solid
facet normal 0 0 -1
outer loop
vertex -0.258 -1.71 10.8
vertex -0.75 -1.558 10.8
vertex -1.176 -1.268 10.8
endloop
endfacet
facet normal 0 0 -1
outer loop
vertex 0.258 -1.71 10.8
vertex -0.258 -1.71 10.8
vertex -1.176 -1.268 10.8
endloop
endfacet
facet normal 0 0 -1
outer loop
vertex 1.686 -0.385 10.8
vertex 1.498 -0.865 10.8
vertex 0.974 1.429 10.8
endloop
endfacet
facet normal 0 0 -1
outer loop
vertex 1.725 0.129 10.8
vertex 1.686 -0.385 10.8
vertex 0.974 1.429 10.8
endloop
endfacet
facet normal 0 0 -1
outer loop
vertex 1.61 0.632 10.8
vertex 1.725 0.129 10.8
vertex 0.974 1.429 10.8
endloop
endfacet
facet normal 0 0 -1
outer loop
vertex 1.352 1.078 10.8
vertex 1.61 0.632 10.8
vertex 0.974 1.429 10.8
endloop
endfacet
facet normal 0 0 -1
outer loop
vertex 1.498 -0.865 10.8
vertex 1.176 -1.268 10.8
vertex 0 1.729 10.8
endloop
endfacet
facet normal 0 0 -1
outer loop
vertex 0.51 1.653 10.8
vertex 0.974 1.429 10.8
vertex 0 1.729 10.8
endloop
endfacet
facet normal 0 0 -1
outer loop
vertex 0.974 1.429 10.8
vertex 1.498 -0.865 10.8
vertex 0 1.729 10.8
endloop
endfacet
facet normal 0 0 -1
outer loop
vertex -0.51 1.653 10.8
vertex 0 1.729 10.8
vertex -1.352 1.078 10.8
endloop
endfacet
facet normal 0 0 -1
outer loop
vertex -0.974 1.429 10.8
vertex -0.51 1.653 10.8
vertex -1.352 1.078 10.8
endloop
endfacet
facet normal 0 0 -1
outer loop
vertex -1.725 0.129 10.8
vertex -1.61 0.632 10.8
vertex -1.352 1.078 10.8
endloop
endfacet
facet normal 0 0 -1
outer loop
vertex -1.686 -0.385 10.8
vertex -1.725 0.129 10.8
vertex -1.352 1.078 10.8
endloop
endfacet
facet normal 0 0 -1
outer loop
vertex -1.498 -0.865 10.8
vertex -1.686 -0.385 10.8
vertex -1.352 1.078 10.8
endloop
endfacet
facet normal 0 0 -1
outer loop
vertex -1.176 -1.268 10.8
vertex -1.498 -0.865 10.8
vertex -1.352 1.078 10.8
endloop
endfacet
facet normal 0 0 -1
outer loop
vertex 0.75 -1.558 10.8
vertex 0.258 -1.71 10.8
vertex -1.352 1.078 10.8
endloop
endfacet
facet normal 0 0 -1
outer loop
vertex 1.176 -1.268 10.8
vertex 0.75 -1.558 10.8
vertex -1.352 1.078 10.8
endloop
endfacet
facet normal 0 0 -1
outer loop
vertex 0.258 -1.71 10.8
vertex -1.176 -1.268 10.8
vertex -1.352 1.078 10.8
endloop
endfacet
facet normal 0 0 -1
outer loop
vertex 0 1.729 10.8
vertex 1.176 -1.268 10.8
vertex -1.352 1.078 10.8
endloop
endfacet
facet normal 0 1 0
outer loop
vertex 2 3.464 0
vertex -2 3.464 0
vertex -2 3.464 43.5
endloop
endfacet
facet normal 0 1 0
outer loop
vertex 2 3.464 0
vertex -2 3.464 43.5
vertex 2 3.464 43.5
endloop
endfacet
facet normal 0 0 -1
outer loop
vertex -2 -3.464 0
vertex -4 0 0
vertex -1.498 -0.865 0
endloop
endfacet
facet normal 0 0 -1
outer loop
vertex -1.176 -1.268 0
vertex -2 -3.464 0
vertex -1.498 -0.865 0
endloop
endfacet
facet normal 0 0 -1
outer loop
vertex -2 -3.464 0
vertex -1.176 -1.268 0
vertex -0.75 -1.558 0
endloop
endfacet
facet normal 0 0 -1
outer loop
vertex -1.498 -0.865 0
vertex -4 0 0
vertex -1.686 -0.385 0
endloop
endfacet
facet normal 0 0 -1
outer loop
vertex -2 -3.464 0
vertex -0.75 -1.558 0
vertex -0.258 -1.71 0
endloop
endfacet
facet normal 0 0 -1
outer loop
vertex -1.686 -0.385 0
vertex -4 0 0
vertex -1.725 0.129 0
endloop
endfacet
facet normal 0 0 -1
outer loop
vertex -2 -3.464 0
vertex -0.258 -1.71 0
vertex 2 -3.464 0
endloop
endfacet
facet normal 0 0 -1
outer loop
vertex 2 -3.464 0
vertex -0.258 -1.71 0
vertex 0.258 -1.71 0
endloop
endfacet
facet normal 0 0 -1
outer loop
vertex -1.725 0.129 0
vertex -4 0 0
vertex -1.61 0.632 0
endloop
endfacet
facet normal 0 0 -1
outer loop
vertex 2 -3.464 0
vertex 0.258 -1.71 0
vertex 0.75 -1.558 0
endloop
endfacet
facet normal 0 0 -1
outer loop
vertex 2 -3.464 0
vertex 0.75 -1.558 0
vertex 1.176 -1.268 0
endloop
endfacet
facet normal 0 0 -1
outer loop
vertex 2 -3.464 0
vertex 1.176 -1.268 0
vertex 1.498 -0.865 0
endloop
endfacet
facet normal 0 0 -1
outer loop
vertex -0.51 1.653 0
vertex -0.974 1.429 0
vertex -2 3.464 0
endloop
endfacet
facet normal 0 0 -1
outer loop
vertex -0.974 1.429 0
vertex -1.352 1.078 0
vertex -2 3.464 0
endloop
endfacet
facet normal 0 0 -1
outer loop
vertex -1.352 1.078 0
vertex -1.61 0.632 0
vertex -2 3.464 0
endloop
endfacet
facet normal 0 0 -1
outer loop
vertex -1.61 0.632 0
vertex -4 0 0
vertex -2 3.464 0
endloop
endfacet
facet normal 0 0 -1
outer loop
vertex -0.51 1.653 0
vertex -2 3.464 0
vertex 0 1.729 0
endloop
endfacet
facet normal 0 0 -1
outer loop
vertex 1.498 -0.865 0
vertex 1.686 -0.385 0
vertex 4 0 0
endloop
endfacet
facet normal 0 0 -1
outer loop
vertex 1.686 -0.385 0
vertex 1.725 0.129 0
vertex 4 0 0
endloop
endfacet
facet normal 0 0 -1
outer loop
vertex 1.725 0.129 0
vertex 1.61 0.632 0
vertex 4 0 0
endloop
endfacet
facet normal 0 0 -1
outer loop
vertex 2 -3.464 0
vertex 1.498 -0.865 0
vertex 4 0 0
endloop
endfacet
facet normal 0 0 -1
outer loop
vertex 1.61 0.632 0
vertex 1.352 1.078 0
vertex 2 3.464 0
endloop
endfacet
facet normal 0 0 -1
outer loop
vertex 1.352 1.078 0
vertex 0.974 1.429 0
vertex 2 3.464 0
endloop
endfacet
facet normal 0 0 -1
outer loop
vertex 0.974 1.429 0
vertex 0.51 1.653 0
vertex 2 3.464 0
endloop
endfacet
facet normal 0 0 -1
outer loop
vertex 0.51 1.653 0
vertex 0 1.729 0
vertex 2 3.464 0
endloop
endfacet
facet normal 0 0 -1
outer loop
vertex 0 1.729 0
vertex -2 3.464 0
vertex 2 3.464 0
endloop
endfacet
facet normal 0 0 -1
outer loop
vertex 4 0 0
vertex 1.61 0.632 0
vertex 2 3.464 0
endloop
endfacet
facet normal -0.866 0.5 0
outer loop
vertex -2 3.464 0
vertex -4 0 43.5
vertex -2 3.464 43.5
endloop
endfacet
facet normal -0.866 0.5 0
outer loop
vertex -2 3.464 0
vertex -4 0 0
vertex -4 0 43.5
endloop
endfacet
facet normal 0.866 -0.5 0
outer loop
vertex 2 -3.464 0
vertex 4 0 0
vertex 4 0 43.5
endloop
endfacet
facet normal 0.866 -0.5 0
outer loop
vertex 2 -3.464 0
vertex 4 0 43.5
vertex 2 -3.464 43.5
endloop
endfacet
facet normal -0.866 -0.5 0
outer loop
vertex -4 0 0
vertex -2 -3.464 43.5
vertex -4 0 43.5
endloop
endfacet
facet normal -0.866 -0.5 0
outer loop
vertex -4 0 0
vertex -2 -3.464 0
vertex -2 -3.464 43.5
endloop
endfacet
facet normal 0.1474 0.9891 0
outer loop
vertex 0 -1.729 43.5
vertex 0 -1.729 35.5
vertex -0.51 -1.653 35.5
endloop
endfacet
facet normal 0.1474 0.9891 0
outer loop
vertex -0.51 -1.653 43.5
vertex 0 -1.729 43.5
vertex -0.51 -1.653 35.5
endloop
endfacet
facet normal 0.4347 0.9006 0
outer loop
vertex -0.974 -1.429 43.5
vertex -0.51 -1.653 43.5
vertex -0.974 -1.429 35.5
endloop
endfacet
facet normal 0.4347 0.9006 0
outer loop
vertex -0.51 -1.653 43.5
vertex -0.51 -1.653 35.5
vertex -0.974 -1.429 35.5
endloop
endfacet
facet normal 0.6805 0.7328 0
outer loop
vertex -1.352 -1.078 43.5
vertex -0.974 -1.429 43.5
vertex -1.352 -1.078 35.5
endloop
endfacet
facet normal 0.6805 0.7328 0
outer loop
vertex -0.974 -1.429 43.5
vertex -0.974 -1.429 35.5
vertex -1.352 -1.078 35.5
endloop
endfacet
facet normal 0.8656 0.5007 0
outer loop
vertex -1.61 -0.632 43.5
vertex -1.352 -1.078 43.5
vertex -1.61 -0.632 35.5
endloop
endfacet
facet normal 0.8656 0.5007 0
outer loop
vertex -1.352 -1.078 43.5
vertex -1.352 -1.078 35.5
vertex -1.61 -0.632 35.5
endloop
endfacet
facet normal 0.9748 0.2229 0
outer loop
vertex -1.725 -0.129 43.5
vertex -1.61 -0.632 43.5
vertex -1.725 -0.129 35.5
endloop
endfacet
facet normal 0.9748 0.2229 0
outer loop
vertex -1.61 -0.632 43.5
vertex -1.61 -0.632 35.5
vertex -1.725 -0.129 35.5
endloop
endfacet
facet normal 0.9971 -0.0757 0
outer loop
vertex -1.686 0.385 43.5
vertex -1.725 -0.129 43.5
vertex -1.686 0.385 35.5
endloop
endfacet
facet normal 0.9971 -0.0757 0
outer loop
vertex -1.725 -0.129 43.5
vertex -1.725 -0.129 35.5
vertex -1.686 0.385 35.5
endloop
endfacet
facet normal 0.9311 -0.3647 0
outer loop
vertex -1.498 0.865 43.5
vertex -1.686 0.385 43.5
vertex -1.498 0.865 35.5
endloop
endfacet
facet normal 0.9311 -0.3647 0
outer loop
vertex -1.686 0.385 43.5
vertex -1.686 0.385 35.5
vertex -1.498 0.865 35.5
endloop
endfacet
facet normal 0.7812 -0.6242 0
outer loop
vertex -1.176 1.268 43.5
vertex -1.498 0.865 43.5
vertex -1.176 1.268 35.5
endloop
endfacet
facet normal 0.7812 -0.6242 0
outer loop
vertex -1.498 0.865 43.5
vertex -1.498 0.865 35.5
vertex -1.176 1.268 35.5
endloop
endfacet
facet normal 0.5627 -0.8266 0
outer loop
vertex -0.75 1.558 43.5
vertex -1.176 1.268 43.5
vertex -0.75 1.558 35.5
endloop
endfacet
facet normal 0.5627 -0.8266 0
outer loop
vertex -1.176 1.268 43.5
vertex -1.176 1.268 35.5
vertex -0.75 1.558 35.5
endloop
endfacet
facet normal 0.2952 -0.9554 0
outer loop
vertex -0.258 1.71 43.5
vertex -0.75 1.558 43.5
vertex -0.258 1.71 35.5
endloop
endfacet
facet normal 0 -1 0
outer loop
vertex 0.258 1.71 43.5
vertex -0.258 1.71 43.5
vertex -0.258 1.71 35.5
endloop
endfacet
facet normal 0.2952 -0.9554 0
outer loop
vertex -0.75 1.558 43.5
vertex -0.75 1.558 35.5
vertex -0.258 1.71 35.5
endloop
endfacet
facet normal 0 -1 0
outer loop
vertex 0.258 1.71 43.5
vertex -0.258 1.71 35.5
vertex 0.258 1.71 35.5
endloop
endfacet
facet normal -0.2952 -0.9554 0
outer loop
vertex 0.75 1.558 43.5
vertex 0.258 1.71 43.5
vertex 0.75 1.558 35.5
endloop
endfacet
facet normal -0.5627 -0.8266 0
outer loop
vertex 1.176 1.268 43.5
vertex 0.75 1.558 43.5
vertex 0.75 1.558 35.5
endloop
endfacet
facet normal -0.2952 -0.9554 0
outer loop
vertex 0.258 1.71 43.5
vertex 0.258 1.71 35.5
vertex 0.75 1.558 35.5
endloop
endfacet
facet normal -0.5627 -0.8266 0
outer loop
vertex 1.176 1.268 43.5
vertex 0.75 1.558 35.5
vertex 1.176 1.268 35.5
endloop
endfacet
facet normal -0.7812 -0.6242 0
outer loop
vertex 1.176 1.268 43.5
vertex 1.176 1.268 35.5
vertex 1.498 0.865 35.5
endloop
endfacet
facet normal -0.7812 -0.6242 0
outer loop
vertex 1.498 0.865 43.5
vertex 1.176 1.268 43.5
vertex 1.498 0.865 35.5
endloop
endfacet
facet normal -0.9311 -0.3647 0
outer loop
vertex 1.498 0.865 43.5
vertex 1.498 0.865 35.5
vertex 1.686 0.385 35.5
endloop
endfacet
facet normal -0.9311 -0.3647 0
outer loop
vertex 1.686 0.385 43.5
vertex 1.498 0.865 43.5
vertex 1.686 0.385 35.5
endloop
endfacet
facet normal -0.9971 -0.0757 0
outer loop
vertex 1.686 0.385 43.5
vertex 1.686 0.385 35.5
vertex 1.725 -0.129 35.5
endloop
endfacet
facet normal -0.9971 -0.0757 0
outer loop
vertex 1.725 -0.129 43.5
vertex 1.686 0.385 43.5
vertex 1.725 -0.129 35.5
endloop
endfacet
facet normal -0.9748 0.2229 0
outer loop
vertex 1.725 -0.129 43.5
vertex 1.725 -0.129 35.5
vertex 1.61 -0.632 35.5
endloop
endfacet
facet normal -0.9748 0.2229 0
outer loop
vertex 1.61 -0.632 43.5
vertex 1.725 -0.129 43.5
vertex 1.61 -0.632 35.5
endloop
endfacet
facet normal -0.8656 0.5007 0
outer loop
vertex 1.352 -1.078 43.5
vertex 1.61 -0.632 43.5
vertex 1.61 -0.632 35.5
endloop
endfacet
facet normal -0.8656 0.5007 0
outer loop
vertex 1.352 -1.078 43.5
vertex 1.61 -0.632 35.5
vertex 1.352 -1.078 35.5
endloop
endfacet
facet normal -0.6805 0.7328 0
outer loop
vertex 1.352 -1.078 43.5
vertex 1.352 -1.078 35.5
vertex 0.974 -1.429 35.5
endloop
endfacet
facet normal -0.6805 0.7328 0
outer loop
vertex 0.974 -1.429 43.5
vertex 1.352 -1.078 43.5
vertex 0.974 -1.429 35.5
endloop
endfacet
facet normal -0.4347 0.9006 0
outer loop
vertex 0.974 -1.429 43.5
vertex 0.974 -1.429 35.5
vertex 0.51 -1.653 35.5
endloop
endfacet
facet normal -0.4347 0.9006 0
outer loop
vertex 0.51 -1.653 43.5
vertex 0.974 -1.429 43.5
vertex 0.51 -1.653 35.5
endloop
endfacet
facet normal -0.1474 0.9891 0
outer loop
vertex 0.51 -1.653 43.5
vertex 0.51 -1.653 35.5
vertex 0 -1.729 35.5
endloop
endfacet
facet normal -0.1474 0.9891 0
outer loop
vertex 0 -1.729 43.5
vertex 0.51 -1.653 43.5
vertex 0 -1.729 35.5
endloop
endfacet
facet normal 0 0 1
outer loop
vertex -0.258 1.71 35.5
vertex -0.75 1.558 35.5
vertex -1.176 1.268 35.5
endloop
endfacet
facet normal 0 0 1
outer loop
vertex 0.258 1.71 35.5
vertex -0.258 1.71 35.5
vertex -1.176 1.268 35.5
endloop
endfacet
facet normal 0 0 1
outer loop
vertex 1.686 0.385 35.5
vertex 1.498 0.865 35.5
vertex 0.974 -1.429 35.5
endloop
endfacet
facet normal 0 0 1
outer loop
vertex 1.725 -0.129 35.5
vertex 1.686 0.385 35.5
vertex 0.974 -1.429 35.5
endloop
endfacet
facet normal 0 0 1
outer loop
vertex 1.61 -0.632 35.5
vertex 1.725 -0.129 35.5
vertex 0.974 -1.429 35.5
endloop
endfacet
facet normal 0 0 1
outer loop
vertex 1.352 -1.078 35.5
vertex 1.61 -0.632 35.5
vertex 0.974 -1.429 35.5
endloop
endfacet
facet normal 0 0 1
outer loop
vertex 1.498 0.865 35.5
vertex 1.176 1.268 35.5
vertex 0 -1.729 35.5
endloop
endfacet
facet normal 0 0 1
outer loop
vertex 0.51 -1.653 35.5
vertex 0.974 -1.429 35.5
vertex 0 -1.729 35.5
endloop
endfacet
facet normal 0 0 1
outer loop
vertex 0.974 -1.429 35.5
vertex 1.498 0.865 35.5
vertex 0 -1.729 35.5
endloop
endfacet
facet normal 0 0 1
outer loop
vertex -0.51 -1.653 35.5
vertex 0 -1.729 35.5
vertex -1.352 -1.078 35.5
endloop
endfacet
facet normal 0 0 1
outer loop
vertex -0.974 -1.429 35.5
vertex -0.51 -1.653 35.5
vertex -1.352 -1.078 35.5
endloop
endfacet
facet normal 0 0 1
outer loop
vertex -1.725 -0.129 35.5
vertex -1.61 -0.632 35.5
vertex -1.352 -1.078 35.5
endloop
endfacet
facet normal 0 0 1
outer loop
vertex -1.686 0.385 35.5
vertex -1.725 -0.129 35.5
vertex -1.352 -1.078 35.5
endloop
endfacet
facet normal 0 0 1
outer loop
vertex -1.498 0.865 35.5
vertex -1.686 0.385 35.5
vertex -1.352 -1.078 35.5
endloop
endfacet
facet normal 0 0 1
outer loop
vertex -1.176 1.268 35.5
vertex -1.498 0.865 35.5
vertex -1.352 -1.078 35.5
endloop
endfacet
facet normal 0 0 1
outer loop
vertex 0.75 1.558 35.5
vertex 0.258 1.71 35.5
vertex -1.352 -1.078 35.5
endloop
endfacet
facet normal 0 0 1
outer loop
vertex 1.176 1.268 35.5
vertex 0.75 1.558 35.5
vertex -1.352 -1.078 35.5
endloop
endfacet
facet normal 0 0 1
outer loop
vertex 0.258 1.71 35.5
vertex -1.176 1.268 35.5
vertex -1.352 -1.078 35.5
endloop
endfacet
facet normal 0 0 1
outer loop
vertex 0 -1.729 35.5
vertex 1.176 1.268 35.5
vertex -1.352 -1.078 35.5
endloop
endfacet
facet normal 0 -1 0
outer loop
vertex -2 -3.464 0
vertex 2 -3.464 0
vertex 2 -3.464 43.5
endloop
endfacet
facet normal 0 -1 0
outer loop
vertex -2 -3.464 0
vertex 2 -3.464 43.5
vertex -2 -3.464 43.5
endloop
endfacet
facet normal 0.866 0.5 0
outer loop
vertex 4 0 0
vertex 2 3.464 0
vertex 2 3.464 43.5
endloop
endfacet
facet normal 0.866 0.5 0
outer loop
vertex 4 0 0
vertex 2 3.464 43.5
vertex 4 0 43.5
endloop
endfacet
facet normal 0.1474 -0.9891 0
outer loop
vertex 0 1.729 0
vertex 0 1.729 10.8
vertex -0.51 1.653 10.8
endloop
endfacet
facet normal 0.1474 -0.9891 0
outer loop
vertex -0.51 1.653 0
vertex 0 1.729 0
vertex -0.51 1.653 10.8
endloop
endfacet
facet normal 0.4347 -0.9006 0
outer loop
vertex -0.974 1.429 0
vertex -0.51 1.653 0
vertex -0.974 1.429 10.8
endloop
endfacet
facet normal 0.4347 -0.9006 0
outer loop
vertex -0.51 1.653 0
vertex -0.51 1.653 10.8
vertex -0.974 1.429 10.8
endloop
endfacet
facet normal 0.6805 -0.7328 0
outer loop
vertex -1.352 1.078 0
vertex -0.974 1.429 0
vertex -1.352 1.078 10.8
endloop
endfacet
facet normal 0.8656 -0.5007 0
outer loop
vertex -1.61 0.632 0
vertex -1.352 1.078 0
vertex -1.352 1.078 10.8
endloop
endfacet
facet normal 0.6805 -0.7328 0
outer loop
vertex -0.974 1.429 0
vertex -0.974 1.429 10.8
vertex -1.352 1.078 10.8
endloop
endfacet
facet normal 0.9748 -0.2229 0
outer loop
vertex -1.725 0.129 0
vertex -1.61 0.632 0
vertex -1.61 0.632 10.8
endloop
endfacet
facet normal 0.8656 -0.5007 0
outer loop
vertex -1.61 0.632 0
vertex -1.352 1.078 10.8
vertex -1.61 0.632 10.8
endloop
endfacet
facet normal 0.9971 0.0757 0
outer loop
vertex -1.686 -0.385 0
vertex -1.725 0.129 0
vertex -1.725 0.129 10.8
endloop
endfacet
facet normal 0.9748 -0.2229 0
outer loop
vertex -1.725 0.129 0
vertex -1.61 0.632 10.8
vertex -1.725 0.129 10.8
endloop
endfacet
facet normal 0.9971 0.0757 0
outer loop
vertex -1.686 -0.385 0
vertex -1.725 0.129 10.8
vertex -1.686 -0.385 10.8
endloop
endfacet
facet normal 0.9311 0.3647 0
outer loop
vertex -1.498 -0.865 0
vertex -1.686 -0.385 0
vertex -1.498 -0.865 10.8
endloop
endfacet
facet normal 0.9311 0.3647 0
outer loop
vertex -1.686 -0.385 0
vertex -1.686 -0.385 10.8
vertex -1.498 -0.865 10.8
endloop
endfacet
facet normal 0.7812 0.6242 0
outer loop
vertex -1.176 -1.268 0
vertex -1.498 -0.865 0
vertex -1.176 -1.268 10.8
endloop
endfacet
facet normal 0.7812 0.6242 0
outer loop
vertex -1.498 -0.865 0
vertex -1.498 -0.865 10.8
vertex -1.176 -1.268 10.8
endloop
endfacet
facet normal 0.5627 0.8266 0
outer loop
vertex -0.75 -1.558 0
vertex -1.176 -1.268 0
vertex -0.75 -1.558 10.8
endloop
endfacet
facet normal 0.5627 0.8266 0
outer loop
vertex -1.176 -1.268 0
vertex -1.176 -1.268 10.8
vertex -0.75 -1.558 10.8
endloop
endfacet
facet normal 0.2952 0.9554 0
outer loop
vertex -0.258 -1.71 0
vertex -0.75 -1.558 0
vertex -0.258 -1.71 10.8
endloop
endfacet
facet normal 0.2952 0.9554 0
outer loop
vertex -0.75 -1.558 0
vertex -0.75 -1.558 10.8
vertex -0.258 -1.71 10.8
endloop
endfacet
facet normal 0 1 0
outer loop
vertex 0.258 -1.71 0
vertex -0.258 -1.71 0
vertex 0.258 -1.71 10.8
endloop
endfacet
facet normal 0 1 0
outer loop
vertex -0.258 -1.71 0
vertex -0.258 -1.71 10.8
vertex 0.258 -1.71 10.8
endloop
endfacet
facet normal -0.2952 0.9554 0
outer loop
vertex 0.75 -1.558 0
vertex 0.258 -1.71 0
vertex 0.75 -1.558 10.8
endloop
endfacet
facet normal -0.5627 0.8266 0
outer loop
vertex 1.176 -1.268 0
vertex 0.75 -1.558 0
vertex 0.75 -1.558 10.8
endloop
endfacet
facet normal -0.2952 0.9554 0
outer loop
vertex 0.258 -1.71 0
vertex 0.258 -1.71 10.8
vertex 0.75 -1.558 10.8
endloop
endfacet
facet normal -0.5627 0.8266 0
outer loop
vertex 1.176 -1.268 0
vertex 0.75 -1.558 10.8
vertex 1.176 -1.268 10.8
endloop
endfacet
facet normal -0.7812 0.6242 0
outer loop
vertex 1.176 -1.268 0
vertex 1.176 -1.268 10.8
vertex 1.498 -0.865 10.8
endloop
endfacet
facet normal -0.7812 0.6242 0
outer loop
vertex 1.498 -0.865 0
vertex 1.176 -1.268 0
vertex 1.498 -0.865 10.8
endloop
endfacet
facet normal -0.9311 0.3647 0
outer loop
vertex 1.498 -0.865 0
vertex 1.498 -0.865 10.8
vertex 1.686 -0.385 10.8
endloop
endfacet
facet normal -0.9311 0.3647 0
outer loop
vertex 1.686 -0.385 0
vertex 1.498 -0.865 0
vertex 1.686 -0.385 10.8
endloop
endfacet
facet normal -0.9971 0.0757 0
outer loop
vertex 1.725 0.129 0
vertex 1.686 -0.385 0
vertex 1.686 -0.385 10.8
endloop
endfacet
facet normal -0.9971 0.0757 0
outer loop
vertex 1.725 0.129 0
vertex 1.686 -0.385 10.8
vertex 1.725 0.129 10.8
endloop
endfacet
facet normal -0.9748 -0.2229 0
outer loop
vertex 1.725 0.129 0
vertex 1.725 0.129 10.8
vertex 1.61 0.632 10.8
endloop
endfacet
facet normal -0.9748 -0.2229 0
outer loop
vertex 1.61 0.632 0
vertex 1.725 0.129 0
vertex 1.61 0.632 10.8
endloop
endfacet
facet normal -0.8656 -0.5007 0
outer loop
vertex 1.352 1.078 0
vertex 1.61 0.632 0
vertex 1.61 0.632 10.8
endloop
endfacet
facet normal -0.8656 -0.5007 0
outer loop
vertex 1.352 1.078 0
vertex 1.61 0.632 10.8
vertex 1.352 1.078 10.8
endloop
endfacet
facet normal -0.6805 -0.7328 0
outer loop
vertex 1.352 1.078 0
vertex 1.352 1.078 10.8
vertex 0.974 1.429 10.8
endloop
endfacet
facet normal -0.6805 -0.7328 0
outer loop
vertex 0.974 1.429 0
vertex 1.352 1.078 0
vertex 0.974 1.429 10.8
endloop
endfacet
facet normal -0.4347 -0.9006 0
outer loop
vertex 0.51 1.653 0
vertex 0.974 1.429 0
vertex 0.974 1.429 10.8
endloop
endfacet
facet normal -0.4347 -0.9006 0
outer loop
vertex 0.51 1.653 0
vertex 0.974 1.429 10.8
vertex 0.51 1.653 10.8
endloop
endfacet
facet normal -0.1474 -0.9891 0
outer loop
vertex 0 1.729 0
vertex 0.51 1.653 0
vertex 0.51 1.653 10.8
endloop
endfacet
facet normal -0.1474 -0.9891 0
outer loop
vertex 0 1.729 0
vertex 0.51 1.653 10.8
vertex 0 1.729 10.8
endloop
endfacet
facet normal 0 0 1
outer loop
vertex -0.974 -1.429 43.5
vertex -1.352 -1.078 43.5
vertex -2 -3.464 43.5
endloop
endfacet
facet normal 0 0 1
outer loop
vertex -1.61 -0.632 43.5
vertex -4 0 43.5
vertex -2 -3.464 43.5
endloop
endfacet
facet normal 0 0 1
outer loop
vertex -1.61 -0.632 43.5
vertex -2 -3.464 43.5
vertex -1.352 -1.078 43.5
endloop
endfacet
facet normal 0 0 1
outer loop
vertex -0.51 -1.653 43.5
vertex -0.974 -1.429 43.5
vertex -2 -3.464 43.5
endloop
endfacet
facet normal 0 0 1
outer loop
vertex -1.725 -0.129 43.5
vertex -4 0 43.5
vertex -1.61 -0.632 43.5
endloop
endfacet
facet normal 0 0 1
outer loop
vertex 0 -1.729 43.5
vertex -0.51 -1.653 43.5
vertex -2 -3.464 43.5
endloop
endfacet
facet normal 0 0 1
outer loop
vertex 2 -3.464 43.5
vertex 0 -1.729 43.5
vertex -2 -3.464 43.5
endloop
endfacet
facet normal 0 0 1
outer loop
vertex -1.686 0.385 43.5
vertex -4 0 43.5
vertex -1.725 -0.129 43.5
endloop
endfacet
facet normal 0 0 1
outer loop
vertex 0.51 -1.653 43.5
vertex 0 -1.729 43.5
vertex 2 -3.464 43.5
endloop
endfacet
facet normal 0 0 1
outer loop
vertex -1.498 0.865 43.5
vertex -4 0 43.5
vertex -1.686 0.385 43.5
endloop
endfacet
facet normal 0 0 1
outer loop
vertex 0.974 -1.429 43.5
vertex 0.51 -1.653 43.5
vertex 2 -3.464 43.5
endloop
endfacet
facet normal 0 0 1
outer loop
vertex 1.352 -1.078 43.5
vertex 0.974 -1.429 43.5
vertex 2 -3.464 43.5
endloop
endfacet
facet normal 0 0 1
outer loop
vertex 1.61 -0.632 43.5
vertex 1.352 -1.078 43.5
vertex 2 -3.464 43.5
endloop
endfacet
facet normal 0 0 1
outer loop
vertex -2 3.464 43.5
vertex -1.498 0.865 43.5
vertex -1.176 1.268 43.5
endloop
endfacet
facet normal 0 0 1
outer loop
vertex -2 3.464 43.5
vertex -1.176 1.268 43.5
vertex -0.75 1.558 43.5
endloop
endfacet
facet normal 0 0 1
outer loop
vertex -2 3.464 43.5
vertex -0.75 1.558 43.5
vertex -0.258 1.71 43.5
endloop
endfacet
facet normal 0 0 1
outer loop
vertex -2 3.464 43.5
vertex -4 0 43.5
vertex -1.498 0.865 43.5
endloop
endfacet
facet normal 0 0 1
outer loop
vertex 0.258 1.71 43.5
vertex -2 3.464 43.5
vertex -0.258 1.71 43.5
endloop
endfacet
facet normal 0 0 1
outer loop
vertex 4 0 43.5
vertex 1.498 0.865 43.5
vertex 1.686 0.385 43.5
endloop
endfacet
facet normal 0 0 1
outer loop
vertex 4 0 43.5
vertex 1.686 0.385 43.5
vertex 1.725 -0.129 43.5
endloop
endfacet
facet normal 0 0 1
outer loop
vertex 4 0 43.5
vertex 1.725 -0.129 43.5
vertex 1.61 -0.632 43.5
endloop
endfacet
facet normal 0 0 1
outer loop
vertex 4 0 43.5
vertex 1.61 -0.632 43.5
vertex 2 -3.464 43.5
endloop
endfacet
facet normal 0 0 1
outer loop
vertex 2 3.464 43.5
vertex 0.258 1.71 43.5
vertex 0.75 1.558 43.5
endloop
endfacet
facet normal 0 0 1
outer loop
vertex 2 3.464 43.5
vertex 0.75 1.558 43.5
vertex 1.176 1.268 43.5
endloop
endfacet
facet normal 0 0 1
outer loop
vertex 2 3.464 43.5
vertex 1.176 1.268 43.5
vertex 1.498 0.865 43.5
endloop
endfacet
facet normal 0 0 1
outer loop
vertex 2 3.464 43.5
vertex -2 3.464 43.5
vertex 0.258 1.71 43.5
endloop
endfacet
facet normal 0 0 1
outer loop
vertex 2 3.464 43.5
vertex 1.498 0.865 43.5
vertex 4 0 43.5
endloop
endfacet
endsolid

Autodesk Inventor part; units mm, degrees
sketch "Sketch1" plane through (0, 0, 0) normal (0, 0, 1) x (1, 0, 0)
  line L0 (0, 2.8582) -> (0, -2.8582) construction
  line L1 (-5.7775, 0) -> (5.7775, 0) construction
  line L2 (0, 0) -> (4, 0)
  line L3 (4, 0) -> (-4, 0)
  circle A0 centre (0, 0) radius 4
  line L4 (0, 0) -> (-2, 3.4641)
  line L5 (0, 0) -> (4, 0) construction
  line L6 (0, 0) -> (2, 3.4641)
  line L7 (0, 0) -> (4, 0) construction
  line L8 (0, 0) -> (4, 0)
  line L9 (0, 0) -> (2, -3.4641)
  line L10 (0, 0) -> (-2, -3.4641)
  line L11 (-2, 3.4641) -> (2, 3.4641)
  line L12 (2, 3.4641) -> (4, 0)
  line L13 (4, 0) -> (2, -3.4641)
  line L14 (2, -3.4641) -> (-2, -3.4641)
  line L15 (-2, -3.4641) -> (-4, 0)
  line L16 (-4, 0) -> (-2, 3.4641)
  dimension "d1" = 4
  dimension "d2" = 8
  dimension "d3" = 120
  dimension "d4" = 60
extrude "Extrusion1" add sketch "Sketch1" along normal blind 43.5 contours L6 L12 L2 | L10 L15 L3 | L3 L16 L4 | L4 L11 L6 | L2 L13 L9 | L9 L14 L10
sketch "Sketch5" plane through (0, 0, 43.5) normal (0, 0, 1) x (1, 0, 0)
  point P0 (0, 0)
  point P1 (0, 0)
hole "Hole2" at (0, 0, 43.5) direction (0, 0, -1) diameter 3.4587 depth 8 thread size "M4x0.5" class "6H" standard "ISO Metric profile"
sketch "Sketch6" plane through (0, 0, 0) normal (0, 0, -1) x (-1, 0, 0)
  point P0 (0, 0)
  point P1 (0, 0)
hole "Hole3" at (0, 0, 0) direction (0, 0, 1) diameter 3.4587 depth 10.8 thread size "M4x0.5" class "6H" standard "ISO Metric profile"
ref_plane "Work Plane1" through (0, 0, 5.4) normal (0, 0, -1) x (-1, 0, 0)
properties part number "Steun stuk" material "S235"
